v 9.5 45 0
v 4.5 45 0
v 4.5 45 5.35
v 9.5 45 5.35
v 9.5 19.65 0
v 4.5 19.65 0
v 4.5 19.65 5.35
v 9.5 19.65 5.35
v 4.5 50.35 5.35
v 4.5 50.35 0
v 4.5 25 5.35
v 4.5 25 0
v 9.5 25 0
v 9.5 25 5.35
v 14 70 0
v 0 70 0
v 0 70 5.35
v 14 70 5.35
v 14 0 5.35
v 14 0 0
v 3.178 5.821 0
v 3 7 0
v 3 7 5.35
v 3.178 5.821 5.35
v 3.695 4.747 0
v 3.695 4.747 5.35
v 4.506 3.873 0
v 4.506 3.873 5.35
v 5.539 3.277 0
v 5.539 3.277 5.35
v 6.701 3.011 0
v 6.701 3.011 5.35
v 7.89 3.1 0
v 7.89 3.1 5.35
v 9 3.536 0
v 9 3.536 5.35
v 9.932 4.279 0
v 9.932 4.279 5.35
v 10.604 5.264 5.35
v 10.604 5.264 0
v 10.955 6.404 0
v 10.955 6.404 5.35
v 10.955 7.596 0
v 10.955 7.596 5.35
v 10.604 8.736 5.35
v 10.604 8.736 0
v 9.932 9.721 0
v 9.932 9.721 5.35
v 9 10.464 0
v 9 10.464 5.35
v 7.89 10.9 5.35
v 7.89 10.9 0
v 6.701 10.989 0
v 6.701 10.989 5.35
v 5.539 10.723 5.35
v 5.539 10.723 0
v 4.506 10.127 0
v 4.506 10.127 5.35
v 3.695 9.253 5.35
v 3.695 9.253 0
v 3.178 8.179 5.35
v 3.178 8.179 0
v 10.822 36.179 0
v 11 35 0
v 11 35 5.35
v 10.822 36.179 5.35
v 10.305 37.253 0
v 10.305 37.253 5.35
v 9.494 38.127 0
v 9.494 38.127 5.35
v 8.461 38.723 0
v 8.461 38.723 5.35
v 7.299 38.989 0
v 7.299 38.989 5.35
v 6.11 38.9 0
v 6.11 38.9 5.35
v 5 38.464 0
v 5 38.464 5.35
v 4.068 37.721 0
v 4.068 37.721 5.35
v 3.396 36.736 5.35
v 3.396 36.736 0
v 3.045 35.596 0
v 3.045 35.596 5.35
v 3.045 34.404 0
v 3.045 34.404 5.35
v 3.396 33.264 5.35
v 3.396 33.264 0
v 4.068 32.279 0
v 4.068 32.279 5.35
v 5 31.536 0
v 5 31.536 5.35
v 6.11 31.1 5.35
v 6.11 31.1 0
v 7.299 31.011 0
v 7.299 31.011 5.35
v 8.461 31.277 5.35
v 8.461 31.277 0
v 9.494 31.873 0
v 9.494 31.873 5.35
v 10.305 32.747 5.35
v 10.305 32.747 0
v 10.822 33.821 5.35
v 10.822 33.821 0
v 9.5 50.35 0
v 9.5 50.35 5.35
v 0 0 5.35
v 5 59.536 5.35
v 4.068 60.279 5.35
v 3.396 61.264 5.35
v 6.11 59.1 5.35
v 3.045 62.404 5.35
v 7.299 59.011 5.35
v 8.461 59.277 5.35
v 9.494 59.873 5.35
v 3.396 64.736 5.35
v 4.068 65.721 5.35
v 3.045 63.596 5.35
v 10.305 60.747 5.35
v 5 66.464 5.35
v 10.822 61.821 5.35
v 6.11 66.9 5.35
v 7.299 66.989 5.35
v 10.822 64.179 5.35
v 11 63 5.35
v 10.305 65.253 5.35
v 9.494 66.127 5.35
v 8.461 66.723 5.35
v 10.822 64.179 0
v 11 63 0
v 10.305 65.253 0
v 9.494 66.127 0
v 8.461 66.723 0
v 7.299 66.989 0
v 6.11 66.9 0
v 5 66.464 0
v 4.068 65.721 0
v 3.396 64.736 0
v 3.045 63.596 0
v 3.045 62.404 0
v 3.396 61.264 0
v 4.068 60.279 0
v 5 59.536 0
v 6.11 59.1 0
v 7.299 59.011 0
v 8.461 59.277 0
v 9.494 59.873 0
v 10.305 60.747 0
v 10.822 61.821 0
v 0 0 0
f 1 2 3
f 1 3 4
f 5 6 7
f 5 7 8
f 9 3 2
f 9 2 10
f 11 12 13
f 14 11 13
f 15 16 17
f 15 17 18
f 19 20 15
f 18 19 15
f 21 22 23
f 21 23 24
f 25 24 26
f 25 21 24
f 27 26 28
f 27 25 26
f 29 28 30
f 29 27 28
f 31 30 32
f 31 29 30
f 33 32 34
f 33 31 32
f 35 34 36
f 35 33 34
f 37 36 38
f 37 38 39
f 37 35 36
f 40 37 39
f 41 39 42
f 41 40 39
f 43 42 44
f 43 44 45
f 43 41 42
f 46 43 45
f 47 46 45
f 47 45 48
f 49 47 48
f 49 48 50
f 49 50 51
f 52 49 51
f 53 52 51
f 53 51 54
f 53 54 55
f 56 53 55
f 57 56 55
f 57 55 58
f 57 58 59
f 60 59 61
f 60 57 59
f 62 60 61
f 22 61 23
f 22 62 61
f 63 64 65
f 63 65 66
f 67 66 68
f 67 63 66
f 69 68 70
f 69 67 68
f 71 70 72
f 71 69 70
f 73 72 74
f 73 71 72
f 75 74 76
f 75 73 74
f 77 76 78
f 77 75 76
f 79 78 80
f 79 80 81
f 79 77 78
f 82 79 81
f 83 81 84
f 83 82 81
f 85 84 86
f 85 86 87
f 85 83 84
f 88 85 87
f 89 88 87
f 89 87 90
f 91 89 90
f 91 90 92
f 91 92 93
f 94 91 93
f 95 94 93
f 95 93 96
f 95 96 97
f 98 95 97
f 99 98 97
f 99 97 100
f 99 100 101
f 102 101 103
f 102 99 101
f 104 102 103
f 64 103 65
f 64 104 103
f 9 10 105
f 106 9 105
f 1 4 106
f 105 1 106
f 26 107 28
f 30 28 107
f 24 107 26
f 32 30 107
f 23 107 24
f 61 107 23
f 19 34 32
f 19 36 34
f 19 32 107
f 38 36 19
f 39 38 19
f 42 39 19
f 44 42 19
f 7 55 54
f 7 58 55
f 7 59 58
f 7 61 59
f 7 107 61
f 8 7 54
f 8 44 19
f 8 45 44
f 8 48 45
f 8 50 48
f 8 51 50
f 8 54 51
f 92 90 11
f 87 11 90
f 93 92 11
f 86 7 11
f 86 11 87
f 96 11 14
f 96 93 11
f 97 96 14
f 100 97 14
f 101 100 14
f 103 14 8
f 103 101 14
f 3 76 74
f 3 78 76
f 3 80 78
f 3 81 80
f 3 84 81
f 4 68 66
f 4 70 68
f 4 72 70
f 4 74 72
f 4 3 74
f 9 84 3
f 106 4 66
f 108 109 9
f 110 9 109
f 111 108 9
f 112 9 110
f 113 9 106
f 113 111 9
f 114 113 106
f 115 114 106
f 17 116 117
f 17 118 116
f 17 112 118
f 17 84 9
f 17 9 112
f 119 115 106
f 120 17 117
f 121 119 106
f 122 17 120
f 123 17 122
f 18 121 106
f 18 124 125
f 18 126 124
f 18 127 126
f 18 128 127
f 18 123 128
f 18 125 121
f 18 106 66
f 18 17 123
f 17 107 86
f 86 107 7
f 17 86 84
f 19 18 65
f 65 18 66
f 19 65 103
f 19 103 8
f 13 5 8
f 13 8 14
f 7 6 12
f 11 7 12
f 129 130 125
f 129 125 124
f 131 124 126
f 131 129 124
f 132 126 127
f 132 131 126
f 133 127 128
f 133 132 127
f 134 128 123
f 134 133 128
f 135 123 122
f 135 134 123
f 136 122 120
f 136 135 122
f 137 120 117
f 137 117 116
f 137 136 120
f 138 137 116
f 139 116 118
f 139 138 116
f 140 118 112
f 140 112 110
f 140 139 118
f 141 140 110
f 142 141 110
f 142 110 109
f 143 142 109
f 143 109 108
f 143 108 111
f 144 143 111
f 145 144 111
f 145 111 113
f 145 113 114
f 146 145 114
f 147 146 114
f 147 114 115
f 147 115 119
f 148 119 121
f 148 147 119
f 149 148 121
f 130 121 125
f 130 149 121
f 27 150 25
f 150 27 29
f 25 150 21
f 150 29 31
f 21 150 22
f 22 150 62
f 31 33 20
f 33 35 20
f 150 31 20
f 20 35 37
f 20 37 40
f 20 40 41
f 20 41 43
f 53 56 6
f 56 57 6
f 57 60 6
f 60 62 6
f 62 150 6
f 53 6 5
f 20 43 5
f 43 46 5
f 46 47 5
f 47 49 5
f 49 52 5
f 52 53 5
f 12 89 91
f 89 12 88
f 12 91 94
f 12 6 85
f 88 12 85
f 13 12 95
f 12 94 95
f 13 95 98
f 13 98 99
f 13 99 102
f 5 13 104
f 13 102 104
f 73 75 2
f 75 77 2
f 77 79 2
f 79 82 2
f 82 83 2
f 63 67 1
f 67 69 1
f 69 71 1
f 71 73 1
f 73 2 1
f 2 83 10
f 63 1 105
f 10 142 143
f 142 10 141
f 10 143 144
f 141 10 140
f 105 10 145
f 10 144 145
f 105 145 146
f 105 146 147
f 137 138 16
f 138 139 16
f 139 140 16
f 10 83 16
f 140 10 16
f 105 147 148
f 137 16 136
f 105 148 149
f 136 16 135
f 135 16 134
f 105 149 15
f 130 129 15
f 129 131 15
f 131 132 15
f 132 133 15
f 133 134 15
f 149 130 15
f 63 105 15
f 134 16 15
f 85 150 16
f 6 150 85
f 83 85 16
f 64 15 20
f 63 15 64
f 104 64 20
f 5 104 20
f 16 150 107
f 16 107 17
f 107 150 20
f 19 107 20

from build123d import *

# Parameters (mm, degrees)
MODEL_W             = 14
MODEL_H             = 70
MODEL_R             = 4
MODEL_W_2           = 5
MODEL_H_2           = 5.35
BOSS_EXTRUDE1_DEPTH = 5.35


with BuildPart() as part:
    # Model → Boss-Extrude1 (new body)
    with BuildSketch(Plane.XY):
        with Locations((7, 35)):
            Rectangle(MODEL_W, MODEL_H)
        with Locations((7, 63)):
            Circle(MODEL_R, mode=Mode.SUBTRACT)
        with Locations(Location((7, 7, 0), (0, 0, 180))):
            Circle(MODEL_R, mode=Mode.SUBTRACT)
        with Locations((7, 35)):
            Circle(MODEL_R, mode=Mode.SUBTRACT)
        with Locations((7, 47.675)):
            Rectangle(MODEL_W_2, MODEL_H_2, mode=Mode.SUBTRACT)
        with Locations((7, 22.325)):
            Rectangle(MODEL_W_2, MODEL_H_2, mode=Mode.SUBTRACT)
    extrude(amount=BOSS_EXTRUDE1_DEPTH)


solid = part.part
